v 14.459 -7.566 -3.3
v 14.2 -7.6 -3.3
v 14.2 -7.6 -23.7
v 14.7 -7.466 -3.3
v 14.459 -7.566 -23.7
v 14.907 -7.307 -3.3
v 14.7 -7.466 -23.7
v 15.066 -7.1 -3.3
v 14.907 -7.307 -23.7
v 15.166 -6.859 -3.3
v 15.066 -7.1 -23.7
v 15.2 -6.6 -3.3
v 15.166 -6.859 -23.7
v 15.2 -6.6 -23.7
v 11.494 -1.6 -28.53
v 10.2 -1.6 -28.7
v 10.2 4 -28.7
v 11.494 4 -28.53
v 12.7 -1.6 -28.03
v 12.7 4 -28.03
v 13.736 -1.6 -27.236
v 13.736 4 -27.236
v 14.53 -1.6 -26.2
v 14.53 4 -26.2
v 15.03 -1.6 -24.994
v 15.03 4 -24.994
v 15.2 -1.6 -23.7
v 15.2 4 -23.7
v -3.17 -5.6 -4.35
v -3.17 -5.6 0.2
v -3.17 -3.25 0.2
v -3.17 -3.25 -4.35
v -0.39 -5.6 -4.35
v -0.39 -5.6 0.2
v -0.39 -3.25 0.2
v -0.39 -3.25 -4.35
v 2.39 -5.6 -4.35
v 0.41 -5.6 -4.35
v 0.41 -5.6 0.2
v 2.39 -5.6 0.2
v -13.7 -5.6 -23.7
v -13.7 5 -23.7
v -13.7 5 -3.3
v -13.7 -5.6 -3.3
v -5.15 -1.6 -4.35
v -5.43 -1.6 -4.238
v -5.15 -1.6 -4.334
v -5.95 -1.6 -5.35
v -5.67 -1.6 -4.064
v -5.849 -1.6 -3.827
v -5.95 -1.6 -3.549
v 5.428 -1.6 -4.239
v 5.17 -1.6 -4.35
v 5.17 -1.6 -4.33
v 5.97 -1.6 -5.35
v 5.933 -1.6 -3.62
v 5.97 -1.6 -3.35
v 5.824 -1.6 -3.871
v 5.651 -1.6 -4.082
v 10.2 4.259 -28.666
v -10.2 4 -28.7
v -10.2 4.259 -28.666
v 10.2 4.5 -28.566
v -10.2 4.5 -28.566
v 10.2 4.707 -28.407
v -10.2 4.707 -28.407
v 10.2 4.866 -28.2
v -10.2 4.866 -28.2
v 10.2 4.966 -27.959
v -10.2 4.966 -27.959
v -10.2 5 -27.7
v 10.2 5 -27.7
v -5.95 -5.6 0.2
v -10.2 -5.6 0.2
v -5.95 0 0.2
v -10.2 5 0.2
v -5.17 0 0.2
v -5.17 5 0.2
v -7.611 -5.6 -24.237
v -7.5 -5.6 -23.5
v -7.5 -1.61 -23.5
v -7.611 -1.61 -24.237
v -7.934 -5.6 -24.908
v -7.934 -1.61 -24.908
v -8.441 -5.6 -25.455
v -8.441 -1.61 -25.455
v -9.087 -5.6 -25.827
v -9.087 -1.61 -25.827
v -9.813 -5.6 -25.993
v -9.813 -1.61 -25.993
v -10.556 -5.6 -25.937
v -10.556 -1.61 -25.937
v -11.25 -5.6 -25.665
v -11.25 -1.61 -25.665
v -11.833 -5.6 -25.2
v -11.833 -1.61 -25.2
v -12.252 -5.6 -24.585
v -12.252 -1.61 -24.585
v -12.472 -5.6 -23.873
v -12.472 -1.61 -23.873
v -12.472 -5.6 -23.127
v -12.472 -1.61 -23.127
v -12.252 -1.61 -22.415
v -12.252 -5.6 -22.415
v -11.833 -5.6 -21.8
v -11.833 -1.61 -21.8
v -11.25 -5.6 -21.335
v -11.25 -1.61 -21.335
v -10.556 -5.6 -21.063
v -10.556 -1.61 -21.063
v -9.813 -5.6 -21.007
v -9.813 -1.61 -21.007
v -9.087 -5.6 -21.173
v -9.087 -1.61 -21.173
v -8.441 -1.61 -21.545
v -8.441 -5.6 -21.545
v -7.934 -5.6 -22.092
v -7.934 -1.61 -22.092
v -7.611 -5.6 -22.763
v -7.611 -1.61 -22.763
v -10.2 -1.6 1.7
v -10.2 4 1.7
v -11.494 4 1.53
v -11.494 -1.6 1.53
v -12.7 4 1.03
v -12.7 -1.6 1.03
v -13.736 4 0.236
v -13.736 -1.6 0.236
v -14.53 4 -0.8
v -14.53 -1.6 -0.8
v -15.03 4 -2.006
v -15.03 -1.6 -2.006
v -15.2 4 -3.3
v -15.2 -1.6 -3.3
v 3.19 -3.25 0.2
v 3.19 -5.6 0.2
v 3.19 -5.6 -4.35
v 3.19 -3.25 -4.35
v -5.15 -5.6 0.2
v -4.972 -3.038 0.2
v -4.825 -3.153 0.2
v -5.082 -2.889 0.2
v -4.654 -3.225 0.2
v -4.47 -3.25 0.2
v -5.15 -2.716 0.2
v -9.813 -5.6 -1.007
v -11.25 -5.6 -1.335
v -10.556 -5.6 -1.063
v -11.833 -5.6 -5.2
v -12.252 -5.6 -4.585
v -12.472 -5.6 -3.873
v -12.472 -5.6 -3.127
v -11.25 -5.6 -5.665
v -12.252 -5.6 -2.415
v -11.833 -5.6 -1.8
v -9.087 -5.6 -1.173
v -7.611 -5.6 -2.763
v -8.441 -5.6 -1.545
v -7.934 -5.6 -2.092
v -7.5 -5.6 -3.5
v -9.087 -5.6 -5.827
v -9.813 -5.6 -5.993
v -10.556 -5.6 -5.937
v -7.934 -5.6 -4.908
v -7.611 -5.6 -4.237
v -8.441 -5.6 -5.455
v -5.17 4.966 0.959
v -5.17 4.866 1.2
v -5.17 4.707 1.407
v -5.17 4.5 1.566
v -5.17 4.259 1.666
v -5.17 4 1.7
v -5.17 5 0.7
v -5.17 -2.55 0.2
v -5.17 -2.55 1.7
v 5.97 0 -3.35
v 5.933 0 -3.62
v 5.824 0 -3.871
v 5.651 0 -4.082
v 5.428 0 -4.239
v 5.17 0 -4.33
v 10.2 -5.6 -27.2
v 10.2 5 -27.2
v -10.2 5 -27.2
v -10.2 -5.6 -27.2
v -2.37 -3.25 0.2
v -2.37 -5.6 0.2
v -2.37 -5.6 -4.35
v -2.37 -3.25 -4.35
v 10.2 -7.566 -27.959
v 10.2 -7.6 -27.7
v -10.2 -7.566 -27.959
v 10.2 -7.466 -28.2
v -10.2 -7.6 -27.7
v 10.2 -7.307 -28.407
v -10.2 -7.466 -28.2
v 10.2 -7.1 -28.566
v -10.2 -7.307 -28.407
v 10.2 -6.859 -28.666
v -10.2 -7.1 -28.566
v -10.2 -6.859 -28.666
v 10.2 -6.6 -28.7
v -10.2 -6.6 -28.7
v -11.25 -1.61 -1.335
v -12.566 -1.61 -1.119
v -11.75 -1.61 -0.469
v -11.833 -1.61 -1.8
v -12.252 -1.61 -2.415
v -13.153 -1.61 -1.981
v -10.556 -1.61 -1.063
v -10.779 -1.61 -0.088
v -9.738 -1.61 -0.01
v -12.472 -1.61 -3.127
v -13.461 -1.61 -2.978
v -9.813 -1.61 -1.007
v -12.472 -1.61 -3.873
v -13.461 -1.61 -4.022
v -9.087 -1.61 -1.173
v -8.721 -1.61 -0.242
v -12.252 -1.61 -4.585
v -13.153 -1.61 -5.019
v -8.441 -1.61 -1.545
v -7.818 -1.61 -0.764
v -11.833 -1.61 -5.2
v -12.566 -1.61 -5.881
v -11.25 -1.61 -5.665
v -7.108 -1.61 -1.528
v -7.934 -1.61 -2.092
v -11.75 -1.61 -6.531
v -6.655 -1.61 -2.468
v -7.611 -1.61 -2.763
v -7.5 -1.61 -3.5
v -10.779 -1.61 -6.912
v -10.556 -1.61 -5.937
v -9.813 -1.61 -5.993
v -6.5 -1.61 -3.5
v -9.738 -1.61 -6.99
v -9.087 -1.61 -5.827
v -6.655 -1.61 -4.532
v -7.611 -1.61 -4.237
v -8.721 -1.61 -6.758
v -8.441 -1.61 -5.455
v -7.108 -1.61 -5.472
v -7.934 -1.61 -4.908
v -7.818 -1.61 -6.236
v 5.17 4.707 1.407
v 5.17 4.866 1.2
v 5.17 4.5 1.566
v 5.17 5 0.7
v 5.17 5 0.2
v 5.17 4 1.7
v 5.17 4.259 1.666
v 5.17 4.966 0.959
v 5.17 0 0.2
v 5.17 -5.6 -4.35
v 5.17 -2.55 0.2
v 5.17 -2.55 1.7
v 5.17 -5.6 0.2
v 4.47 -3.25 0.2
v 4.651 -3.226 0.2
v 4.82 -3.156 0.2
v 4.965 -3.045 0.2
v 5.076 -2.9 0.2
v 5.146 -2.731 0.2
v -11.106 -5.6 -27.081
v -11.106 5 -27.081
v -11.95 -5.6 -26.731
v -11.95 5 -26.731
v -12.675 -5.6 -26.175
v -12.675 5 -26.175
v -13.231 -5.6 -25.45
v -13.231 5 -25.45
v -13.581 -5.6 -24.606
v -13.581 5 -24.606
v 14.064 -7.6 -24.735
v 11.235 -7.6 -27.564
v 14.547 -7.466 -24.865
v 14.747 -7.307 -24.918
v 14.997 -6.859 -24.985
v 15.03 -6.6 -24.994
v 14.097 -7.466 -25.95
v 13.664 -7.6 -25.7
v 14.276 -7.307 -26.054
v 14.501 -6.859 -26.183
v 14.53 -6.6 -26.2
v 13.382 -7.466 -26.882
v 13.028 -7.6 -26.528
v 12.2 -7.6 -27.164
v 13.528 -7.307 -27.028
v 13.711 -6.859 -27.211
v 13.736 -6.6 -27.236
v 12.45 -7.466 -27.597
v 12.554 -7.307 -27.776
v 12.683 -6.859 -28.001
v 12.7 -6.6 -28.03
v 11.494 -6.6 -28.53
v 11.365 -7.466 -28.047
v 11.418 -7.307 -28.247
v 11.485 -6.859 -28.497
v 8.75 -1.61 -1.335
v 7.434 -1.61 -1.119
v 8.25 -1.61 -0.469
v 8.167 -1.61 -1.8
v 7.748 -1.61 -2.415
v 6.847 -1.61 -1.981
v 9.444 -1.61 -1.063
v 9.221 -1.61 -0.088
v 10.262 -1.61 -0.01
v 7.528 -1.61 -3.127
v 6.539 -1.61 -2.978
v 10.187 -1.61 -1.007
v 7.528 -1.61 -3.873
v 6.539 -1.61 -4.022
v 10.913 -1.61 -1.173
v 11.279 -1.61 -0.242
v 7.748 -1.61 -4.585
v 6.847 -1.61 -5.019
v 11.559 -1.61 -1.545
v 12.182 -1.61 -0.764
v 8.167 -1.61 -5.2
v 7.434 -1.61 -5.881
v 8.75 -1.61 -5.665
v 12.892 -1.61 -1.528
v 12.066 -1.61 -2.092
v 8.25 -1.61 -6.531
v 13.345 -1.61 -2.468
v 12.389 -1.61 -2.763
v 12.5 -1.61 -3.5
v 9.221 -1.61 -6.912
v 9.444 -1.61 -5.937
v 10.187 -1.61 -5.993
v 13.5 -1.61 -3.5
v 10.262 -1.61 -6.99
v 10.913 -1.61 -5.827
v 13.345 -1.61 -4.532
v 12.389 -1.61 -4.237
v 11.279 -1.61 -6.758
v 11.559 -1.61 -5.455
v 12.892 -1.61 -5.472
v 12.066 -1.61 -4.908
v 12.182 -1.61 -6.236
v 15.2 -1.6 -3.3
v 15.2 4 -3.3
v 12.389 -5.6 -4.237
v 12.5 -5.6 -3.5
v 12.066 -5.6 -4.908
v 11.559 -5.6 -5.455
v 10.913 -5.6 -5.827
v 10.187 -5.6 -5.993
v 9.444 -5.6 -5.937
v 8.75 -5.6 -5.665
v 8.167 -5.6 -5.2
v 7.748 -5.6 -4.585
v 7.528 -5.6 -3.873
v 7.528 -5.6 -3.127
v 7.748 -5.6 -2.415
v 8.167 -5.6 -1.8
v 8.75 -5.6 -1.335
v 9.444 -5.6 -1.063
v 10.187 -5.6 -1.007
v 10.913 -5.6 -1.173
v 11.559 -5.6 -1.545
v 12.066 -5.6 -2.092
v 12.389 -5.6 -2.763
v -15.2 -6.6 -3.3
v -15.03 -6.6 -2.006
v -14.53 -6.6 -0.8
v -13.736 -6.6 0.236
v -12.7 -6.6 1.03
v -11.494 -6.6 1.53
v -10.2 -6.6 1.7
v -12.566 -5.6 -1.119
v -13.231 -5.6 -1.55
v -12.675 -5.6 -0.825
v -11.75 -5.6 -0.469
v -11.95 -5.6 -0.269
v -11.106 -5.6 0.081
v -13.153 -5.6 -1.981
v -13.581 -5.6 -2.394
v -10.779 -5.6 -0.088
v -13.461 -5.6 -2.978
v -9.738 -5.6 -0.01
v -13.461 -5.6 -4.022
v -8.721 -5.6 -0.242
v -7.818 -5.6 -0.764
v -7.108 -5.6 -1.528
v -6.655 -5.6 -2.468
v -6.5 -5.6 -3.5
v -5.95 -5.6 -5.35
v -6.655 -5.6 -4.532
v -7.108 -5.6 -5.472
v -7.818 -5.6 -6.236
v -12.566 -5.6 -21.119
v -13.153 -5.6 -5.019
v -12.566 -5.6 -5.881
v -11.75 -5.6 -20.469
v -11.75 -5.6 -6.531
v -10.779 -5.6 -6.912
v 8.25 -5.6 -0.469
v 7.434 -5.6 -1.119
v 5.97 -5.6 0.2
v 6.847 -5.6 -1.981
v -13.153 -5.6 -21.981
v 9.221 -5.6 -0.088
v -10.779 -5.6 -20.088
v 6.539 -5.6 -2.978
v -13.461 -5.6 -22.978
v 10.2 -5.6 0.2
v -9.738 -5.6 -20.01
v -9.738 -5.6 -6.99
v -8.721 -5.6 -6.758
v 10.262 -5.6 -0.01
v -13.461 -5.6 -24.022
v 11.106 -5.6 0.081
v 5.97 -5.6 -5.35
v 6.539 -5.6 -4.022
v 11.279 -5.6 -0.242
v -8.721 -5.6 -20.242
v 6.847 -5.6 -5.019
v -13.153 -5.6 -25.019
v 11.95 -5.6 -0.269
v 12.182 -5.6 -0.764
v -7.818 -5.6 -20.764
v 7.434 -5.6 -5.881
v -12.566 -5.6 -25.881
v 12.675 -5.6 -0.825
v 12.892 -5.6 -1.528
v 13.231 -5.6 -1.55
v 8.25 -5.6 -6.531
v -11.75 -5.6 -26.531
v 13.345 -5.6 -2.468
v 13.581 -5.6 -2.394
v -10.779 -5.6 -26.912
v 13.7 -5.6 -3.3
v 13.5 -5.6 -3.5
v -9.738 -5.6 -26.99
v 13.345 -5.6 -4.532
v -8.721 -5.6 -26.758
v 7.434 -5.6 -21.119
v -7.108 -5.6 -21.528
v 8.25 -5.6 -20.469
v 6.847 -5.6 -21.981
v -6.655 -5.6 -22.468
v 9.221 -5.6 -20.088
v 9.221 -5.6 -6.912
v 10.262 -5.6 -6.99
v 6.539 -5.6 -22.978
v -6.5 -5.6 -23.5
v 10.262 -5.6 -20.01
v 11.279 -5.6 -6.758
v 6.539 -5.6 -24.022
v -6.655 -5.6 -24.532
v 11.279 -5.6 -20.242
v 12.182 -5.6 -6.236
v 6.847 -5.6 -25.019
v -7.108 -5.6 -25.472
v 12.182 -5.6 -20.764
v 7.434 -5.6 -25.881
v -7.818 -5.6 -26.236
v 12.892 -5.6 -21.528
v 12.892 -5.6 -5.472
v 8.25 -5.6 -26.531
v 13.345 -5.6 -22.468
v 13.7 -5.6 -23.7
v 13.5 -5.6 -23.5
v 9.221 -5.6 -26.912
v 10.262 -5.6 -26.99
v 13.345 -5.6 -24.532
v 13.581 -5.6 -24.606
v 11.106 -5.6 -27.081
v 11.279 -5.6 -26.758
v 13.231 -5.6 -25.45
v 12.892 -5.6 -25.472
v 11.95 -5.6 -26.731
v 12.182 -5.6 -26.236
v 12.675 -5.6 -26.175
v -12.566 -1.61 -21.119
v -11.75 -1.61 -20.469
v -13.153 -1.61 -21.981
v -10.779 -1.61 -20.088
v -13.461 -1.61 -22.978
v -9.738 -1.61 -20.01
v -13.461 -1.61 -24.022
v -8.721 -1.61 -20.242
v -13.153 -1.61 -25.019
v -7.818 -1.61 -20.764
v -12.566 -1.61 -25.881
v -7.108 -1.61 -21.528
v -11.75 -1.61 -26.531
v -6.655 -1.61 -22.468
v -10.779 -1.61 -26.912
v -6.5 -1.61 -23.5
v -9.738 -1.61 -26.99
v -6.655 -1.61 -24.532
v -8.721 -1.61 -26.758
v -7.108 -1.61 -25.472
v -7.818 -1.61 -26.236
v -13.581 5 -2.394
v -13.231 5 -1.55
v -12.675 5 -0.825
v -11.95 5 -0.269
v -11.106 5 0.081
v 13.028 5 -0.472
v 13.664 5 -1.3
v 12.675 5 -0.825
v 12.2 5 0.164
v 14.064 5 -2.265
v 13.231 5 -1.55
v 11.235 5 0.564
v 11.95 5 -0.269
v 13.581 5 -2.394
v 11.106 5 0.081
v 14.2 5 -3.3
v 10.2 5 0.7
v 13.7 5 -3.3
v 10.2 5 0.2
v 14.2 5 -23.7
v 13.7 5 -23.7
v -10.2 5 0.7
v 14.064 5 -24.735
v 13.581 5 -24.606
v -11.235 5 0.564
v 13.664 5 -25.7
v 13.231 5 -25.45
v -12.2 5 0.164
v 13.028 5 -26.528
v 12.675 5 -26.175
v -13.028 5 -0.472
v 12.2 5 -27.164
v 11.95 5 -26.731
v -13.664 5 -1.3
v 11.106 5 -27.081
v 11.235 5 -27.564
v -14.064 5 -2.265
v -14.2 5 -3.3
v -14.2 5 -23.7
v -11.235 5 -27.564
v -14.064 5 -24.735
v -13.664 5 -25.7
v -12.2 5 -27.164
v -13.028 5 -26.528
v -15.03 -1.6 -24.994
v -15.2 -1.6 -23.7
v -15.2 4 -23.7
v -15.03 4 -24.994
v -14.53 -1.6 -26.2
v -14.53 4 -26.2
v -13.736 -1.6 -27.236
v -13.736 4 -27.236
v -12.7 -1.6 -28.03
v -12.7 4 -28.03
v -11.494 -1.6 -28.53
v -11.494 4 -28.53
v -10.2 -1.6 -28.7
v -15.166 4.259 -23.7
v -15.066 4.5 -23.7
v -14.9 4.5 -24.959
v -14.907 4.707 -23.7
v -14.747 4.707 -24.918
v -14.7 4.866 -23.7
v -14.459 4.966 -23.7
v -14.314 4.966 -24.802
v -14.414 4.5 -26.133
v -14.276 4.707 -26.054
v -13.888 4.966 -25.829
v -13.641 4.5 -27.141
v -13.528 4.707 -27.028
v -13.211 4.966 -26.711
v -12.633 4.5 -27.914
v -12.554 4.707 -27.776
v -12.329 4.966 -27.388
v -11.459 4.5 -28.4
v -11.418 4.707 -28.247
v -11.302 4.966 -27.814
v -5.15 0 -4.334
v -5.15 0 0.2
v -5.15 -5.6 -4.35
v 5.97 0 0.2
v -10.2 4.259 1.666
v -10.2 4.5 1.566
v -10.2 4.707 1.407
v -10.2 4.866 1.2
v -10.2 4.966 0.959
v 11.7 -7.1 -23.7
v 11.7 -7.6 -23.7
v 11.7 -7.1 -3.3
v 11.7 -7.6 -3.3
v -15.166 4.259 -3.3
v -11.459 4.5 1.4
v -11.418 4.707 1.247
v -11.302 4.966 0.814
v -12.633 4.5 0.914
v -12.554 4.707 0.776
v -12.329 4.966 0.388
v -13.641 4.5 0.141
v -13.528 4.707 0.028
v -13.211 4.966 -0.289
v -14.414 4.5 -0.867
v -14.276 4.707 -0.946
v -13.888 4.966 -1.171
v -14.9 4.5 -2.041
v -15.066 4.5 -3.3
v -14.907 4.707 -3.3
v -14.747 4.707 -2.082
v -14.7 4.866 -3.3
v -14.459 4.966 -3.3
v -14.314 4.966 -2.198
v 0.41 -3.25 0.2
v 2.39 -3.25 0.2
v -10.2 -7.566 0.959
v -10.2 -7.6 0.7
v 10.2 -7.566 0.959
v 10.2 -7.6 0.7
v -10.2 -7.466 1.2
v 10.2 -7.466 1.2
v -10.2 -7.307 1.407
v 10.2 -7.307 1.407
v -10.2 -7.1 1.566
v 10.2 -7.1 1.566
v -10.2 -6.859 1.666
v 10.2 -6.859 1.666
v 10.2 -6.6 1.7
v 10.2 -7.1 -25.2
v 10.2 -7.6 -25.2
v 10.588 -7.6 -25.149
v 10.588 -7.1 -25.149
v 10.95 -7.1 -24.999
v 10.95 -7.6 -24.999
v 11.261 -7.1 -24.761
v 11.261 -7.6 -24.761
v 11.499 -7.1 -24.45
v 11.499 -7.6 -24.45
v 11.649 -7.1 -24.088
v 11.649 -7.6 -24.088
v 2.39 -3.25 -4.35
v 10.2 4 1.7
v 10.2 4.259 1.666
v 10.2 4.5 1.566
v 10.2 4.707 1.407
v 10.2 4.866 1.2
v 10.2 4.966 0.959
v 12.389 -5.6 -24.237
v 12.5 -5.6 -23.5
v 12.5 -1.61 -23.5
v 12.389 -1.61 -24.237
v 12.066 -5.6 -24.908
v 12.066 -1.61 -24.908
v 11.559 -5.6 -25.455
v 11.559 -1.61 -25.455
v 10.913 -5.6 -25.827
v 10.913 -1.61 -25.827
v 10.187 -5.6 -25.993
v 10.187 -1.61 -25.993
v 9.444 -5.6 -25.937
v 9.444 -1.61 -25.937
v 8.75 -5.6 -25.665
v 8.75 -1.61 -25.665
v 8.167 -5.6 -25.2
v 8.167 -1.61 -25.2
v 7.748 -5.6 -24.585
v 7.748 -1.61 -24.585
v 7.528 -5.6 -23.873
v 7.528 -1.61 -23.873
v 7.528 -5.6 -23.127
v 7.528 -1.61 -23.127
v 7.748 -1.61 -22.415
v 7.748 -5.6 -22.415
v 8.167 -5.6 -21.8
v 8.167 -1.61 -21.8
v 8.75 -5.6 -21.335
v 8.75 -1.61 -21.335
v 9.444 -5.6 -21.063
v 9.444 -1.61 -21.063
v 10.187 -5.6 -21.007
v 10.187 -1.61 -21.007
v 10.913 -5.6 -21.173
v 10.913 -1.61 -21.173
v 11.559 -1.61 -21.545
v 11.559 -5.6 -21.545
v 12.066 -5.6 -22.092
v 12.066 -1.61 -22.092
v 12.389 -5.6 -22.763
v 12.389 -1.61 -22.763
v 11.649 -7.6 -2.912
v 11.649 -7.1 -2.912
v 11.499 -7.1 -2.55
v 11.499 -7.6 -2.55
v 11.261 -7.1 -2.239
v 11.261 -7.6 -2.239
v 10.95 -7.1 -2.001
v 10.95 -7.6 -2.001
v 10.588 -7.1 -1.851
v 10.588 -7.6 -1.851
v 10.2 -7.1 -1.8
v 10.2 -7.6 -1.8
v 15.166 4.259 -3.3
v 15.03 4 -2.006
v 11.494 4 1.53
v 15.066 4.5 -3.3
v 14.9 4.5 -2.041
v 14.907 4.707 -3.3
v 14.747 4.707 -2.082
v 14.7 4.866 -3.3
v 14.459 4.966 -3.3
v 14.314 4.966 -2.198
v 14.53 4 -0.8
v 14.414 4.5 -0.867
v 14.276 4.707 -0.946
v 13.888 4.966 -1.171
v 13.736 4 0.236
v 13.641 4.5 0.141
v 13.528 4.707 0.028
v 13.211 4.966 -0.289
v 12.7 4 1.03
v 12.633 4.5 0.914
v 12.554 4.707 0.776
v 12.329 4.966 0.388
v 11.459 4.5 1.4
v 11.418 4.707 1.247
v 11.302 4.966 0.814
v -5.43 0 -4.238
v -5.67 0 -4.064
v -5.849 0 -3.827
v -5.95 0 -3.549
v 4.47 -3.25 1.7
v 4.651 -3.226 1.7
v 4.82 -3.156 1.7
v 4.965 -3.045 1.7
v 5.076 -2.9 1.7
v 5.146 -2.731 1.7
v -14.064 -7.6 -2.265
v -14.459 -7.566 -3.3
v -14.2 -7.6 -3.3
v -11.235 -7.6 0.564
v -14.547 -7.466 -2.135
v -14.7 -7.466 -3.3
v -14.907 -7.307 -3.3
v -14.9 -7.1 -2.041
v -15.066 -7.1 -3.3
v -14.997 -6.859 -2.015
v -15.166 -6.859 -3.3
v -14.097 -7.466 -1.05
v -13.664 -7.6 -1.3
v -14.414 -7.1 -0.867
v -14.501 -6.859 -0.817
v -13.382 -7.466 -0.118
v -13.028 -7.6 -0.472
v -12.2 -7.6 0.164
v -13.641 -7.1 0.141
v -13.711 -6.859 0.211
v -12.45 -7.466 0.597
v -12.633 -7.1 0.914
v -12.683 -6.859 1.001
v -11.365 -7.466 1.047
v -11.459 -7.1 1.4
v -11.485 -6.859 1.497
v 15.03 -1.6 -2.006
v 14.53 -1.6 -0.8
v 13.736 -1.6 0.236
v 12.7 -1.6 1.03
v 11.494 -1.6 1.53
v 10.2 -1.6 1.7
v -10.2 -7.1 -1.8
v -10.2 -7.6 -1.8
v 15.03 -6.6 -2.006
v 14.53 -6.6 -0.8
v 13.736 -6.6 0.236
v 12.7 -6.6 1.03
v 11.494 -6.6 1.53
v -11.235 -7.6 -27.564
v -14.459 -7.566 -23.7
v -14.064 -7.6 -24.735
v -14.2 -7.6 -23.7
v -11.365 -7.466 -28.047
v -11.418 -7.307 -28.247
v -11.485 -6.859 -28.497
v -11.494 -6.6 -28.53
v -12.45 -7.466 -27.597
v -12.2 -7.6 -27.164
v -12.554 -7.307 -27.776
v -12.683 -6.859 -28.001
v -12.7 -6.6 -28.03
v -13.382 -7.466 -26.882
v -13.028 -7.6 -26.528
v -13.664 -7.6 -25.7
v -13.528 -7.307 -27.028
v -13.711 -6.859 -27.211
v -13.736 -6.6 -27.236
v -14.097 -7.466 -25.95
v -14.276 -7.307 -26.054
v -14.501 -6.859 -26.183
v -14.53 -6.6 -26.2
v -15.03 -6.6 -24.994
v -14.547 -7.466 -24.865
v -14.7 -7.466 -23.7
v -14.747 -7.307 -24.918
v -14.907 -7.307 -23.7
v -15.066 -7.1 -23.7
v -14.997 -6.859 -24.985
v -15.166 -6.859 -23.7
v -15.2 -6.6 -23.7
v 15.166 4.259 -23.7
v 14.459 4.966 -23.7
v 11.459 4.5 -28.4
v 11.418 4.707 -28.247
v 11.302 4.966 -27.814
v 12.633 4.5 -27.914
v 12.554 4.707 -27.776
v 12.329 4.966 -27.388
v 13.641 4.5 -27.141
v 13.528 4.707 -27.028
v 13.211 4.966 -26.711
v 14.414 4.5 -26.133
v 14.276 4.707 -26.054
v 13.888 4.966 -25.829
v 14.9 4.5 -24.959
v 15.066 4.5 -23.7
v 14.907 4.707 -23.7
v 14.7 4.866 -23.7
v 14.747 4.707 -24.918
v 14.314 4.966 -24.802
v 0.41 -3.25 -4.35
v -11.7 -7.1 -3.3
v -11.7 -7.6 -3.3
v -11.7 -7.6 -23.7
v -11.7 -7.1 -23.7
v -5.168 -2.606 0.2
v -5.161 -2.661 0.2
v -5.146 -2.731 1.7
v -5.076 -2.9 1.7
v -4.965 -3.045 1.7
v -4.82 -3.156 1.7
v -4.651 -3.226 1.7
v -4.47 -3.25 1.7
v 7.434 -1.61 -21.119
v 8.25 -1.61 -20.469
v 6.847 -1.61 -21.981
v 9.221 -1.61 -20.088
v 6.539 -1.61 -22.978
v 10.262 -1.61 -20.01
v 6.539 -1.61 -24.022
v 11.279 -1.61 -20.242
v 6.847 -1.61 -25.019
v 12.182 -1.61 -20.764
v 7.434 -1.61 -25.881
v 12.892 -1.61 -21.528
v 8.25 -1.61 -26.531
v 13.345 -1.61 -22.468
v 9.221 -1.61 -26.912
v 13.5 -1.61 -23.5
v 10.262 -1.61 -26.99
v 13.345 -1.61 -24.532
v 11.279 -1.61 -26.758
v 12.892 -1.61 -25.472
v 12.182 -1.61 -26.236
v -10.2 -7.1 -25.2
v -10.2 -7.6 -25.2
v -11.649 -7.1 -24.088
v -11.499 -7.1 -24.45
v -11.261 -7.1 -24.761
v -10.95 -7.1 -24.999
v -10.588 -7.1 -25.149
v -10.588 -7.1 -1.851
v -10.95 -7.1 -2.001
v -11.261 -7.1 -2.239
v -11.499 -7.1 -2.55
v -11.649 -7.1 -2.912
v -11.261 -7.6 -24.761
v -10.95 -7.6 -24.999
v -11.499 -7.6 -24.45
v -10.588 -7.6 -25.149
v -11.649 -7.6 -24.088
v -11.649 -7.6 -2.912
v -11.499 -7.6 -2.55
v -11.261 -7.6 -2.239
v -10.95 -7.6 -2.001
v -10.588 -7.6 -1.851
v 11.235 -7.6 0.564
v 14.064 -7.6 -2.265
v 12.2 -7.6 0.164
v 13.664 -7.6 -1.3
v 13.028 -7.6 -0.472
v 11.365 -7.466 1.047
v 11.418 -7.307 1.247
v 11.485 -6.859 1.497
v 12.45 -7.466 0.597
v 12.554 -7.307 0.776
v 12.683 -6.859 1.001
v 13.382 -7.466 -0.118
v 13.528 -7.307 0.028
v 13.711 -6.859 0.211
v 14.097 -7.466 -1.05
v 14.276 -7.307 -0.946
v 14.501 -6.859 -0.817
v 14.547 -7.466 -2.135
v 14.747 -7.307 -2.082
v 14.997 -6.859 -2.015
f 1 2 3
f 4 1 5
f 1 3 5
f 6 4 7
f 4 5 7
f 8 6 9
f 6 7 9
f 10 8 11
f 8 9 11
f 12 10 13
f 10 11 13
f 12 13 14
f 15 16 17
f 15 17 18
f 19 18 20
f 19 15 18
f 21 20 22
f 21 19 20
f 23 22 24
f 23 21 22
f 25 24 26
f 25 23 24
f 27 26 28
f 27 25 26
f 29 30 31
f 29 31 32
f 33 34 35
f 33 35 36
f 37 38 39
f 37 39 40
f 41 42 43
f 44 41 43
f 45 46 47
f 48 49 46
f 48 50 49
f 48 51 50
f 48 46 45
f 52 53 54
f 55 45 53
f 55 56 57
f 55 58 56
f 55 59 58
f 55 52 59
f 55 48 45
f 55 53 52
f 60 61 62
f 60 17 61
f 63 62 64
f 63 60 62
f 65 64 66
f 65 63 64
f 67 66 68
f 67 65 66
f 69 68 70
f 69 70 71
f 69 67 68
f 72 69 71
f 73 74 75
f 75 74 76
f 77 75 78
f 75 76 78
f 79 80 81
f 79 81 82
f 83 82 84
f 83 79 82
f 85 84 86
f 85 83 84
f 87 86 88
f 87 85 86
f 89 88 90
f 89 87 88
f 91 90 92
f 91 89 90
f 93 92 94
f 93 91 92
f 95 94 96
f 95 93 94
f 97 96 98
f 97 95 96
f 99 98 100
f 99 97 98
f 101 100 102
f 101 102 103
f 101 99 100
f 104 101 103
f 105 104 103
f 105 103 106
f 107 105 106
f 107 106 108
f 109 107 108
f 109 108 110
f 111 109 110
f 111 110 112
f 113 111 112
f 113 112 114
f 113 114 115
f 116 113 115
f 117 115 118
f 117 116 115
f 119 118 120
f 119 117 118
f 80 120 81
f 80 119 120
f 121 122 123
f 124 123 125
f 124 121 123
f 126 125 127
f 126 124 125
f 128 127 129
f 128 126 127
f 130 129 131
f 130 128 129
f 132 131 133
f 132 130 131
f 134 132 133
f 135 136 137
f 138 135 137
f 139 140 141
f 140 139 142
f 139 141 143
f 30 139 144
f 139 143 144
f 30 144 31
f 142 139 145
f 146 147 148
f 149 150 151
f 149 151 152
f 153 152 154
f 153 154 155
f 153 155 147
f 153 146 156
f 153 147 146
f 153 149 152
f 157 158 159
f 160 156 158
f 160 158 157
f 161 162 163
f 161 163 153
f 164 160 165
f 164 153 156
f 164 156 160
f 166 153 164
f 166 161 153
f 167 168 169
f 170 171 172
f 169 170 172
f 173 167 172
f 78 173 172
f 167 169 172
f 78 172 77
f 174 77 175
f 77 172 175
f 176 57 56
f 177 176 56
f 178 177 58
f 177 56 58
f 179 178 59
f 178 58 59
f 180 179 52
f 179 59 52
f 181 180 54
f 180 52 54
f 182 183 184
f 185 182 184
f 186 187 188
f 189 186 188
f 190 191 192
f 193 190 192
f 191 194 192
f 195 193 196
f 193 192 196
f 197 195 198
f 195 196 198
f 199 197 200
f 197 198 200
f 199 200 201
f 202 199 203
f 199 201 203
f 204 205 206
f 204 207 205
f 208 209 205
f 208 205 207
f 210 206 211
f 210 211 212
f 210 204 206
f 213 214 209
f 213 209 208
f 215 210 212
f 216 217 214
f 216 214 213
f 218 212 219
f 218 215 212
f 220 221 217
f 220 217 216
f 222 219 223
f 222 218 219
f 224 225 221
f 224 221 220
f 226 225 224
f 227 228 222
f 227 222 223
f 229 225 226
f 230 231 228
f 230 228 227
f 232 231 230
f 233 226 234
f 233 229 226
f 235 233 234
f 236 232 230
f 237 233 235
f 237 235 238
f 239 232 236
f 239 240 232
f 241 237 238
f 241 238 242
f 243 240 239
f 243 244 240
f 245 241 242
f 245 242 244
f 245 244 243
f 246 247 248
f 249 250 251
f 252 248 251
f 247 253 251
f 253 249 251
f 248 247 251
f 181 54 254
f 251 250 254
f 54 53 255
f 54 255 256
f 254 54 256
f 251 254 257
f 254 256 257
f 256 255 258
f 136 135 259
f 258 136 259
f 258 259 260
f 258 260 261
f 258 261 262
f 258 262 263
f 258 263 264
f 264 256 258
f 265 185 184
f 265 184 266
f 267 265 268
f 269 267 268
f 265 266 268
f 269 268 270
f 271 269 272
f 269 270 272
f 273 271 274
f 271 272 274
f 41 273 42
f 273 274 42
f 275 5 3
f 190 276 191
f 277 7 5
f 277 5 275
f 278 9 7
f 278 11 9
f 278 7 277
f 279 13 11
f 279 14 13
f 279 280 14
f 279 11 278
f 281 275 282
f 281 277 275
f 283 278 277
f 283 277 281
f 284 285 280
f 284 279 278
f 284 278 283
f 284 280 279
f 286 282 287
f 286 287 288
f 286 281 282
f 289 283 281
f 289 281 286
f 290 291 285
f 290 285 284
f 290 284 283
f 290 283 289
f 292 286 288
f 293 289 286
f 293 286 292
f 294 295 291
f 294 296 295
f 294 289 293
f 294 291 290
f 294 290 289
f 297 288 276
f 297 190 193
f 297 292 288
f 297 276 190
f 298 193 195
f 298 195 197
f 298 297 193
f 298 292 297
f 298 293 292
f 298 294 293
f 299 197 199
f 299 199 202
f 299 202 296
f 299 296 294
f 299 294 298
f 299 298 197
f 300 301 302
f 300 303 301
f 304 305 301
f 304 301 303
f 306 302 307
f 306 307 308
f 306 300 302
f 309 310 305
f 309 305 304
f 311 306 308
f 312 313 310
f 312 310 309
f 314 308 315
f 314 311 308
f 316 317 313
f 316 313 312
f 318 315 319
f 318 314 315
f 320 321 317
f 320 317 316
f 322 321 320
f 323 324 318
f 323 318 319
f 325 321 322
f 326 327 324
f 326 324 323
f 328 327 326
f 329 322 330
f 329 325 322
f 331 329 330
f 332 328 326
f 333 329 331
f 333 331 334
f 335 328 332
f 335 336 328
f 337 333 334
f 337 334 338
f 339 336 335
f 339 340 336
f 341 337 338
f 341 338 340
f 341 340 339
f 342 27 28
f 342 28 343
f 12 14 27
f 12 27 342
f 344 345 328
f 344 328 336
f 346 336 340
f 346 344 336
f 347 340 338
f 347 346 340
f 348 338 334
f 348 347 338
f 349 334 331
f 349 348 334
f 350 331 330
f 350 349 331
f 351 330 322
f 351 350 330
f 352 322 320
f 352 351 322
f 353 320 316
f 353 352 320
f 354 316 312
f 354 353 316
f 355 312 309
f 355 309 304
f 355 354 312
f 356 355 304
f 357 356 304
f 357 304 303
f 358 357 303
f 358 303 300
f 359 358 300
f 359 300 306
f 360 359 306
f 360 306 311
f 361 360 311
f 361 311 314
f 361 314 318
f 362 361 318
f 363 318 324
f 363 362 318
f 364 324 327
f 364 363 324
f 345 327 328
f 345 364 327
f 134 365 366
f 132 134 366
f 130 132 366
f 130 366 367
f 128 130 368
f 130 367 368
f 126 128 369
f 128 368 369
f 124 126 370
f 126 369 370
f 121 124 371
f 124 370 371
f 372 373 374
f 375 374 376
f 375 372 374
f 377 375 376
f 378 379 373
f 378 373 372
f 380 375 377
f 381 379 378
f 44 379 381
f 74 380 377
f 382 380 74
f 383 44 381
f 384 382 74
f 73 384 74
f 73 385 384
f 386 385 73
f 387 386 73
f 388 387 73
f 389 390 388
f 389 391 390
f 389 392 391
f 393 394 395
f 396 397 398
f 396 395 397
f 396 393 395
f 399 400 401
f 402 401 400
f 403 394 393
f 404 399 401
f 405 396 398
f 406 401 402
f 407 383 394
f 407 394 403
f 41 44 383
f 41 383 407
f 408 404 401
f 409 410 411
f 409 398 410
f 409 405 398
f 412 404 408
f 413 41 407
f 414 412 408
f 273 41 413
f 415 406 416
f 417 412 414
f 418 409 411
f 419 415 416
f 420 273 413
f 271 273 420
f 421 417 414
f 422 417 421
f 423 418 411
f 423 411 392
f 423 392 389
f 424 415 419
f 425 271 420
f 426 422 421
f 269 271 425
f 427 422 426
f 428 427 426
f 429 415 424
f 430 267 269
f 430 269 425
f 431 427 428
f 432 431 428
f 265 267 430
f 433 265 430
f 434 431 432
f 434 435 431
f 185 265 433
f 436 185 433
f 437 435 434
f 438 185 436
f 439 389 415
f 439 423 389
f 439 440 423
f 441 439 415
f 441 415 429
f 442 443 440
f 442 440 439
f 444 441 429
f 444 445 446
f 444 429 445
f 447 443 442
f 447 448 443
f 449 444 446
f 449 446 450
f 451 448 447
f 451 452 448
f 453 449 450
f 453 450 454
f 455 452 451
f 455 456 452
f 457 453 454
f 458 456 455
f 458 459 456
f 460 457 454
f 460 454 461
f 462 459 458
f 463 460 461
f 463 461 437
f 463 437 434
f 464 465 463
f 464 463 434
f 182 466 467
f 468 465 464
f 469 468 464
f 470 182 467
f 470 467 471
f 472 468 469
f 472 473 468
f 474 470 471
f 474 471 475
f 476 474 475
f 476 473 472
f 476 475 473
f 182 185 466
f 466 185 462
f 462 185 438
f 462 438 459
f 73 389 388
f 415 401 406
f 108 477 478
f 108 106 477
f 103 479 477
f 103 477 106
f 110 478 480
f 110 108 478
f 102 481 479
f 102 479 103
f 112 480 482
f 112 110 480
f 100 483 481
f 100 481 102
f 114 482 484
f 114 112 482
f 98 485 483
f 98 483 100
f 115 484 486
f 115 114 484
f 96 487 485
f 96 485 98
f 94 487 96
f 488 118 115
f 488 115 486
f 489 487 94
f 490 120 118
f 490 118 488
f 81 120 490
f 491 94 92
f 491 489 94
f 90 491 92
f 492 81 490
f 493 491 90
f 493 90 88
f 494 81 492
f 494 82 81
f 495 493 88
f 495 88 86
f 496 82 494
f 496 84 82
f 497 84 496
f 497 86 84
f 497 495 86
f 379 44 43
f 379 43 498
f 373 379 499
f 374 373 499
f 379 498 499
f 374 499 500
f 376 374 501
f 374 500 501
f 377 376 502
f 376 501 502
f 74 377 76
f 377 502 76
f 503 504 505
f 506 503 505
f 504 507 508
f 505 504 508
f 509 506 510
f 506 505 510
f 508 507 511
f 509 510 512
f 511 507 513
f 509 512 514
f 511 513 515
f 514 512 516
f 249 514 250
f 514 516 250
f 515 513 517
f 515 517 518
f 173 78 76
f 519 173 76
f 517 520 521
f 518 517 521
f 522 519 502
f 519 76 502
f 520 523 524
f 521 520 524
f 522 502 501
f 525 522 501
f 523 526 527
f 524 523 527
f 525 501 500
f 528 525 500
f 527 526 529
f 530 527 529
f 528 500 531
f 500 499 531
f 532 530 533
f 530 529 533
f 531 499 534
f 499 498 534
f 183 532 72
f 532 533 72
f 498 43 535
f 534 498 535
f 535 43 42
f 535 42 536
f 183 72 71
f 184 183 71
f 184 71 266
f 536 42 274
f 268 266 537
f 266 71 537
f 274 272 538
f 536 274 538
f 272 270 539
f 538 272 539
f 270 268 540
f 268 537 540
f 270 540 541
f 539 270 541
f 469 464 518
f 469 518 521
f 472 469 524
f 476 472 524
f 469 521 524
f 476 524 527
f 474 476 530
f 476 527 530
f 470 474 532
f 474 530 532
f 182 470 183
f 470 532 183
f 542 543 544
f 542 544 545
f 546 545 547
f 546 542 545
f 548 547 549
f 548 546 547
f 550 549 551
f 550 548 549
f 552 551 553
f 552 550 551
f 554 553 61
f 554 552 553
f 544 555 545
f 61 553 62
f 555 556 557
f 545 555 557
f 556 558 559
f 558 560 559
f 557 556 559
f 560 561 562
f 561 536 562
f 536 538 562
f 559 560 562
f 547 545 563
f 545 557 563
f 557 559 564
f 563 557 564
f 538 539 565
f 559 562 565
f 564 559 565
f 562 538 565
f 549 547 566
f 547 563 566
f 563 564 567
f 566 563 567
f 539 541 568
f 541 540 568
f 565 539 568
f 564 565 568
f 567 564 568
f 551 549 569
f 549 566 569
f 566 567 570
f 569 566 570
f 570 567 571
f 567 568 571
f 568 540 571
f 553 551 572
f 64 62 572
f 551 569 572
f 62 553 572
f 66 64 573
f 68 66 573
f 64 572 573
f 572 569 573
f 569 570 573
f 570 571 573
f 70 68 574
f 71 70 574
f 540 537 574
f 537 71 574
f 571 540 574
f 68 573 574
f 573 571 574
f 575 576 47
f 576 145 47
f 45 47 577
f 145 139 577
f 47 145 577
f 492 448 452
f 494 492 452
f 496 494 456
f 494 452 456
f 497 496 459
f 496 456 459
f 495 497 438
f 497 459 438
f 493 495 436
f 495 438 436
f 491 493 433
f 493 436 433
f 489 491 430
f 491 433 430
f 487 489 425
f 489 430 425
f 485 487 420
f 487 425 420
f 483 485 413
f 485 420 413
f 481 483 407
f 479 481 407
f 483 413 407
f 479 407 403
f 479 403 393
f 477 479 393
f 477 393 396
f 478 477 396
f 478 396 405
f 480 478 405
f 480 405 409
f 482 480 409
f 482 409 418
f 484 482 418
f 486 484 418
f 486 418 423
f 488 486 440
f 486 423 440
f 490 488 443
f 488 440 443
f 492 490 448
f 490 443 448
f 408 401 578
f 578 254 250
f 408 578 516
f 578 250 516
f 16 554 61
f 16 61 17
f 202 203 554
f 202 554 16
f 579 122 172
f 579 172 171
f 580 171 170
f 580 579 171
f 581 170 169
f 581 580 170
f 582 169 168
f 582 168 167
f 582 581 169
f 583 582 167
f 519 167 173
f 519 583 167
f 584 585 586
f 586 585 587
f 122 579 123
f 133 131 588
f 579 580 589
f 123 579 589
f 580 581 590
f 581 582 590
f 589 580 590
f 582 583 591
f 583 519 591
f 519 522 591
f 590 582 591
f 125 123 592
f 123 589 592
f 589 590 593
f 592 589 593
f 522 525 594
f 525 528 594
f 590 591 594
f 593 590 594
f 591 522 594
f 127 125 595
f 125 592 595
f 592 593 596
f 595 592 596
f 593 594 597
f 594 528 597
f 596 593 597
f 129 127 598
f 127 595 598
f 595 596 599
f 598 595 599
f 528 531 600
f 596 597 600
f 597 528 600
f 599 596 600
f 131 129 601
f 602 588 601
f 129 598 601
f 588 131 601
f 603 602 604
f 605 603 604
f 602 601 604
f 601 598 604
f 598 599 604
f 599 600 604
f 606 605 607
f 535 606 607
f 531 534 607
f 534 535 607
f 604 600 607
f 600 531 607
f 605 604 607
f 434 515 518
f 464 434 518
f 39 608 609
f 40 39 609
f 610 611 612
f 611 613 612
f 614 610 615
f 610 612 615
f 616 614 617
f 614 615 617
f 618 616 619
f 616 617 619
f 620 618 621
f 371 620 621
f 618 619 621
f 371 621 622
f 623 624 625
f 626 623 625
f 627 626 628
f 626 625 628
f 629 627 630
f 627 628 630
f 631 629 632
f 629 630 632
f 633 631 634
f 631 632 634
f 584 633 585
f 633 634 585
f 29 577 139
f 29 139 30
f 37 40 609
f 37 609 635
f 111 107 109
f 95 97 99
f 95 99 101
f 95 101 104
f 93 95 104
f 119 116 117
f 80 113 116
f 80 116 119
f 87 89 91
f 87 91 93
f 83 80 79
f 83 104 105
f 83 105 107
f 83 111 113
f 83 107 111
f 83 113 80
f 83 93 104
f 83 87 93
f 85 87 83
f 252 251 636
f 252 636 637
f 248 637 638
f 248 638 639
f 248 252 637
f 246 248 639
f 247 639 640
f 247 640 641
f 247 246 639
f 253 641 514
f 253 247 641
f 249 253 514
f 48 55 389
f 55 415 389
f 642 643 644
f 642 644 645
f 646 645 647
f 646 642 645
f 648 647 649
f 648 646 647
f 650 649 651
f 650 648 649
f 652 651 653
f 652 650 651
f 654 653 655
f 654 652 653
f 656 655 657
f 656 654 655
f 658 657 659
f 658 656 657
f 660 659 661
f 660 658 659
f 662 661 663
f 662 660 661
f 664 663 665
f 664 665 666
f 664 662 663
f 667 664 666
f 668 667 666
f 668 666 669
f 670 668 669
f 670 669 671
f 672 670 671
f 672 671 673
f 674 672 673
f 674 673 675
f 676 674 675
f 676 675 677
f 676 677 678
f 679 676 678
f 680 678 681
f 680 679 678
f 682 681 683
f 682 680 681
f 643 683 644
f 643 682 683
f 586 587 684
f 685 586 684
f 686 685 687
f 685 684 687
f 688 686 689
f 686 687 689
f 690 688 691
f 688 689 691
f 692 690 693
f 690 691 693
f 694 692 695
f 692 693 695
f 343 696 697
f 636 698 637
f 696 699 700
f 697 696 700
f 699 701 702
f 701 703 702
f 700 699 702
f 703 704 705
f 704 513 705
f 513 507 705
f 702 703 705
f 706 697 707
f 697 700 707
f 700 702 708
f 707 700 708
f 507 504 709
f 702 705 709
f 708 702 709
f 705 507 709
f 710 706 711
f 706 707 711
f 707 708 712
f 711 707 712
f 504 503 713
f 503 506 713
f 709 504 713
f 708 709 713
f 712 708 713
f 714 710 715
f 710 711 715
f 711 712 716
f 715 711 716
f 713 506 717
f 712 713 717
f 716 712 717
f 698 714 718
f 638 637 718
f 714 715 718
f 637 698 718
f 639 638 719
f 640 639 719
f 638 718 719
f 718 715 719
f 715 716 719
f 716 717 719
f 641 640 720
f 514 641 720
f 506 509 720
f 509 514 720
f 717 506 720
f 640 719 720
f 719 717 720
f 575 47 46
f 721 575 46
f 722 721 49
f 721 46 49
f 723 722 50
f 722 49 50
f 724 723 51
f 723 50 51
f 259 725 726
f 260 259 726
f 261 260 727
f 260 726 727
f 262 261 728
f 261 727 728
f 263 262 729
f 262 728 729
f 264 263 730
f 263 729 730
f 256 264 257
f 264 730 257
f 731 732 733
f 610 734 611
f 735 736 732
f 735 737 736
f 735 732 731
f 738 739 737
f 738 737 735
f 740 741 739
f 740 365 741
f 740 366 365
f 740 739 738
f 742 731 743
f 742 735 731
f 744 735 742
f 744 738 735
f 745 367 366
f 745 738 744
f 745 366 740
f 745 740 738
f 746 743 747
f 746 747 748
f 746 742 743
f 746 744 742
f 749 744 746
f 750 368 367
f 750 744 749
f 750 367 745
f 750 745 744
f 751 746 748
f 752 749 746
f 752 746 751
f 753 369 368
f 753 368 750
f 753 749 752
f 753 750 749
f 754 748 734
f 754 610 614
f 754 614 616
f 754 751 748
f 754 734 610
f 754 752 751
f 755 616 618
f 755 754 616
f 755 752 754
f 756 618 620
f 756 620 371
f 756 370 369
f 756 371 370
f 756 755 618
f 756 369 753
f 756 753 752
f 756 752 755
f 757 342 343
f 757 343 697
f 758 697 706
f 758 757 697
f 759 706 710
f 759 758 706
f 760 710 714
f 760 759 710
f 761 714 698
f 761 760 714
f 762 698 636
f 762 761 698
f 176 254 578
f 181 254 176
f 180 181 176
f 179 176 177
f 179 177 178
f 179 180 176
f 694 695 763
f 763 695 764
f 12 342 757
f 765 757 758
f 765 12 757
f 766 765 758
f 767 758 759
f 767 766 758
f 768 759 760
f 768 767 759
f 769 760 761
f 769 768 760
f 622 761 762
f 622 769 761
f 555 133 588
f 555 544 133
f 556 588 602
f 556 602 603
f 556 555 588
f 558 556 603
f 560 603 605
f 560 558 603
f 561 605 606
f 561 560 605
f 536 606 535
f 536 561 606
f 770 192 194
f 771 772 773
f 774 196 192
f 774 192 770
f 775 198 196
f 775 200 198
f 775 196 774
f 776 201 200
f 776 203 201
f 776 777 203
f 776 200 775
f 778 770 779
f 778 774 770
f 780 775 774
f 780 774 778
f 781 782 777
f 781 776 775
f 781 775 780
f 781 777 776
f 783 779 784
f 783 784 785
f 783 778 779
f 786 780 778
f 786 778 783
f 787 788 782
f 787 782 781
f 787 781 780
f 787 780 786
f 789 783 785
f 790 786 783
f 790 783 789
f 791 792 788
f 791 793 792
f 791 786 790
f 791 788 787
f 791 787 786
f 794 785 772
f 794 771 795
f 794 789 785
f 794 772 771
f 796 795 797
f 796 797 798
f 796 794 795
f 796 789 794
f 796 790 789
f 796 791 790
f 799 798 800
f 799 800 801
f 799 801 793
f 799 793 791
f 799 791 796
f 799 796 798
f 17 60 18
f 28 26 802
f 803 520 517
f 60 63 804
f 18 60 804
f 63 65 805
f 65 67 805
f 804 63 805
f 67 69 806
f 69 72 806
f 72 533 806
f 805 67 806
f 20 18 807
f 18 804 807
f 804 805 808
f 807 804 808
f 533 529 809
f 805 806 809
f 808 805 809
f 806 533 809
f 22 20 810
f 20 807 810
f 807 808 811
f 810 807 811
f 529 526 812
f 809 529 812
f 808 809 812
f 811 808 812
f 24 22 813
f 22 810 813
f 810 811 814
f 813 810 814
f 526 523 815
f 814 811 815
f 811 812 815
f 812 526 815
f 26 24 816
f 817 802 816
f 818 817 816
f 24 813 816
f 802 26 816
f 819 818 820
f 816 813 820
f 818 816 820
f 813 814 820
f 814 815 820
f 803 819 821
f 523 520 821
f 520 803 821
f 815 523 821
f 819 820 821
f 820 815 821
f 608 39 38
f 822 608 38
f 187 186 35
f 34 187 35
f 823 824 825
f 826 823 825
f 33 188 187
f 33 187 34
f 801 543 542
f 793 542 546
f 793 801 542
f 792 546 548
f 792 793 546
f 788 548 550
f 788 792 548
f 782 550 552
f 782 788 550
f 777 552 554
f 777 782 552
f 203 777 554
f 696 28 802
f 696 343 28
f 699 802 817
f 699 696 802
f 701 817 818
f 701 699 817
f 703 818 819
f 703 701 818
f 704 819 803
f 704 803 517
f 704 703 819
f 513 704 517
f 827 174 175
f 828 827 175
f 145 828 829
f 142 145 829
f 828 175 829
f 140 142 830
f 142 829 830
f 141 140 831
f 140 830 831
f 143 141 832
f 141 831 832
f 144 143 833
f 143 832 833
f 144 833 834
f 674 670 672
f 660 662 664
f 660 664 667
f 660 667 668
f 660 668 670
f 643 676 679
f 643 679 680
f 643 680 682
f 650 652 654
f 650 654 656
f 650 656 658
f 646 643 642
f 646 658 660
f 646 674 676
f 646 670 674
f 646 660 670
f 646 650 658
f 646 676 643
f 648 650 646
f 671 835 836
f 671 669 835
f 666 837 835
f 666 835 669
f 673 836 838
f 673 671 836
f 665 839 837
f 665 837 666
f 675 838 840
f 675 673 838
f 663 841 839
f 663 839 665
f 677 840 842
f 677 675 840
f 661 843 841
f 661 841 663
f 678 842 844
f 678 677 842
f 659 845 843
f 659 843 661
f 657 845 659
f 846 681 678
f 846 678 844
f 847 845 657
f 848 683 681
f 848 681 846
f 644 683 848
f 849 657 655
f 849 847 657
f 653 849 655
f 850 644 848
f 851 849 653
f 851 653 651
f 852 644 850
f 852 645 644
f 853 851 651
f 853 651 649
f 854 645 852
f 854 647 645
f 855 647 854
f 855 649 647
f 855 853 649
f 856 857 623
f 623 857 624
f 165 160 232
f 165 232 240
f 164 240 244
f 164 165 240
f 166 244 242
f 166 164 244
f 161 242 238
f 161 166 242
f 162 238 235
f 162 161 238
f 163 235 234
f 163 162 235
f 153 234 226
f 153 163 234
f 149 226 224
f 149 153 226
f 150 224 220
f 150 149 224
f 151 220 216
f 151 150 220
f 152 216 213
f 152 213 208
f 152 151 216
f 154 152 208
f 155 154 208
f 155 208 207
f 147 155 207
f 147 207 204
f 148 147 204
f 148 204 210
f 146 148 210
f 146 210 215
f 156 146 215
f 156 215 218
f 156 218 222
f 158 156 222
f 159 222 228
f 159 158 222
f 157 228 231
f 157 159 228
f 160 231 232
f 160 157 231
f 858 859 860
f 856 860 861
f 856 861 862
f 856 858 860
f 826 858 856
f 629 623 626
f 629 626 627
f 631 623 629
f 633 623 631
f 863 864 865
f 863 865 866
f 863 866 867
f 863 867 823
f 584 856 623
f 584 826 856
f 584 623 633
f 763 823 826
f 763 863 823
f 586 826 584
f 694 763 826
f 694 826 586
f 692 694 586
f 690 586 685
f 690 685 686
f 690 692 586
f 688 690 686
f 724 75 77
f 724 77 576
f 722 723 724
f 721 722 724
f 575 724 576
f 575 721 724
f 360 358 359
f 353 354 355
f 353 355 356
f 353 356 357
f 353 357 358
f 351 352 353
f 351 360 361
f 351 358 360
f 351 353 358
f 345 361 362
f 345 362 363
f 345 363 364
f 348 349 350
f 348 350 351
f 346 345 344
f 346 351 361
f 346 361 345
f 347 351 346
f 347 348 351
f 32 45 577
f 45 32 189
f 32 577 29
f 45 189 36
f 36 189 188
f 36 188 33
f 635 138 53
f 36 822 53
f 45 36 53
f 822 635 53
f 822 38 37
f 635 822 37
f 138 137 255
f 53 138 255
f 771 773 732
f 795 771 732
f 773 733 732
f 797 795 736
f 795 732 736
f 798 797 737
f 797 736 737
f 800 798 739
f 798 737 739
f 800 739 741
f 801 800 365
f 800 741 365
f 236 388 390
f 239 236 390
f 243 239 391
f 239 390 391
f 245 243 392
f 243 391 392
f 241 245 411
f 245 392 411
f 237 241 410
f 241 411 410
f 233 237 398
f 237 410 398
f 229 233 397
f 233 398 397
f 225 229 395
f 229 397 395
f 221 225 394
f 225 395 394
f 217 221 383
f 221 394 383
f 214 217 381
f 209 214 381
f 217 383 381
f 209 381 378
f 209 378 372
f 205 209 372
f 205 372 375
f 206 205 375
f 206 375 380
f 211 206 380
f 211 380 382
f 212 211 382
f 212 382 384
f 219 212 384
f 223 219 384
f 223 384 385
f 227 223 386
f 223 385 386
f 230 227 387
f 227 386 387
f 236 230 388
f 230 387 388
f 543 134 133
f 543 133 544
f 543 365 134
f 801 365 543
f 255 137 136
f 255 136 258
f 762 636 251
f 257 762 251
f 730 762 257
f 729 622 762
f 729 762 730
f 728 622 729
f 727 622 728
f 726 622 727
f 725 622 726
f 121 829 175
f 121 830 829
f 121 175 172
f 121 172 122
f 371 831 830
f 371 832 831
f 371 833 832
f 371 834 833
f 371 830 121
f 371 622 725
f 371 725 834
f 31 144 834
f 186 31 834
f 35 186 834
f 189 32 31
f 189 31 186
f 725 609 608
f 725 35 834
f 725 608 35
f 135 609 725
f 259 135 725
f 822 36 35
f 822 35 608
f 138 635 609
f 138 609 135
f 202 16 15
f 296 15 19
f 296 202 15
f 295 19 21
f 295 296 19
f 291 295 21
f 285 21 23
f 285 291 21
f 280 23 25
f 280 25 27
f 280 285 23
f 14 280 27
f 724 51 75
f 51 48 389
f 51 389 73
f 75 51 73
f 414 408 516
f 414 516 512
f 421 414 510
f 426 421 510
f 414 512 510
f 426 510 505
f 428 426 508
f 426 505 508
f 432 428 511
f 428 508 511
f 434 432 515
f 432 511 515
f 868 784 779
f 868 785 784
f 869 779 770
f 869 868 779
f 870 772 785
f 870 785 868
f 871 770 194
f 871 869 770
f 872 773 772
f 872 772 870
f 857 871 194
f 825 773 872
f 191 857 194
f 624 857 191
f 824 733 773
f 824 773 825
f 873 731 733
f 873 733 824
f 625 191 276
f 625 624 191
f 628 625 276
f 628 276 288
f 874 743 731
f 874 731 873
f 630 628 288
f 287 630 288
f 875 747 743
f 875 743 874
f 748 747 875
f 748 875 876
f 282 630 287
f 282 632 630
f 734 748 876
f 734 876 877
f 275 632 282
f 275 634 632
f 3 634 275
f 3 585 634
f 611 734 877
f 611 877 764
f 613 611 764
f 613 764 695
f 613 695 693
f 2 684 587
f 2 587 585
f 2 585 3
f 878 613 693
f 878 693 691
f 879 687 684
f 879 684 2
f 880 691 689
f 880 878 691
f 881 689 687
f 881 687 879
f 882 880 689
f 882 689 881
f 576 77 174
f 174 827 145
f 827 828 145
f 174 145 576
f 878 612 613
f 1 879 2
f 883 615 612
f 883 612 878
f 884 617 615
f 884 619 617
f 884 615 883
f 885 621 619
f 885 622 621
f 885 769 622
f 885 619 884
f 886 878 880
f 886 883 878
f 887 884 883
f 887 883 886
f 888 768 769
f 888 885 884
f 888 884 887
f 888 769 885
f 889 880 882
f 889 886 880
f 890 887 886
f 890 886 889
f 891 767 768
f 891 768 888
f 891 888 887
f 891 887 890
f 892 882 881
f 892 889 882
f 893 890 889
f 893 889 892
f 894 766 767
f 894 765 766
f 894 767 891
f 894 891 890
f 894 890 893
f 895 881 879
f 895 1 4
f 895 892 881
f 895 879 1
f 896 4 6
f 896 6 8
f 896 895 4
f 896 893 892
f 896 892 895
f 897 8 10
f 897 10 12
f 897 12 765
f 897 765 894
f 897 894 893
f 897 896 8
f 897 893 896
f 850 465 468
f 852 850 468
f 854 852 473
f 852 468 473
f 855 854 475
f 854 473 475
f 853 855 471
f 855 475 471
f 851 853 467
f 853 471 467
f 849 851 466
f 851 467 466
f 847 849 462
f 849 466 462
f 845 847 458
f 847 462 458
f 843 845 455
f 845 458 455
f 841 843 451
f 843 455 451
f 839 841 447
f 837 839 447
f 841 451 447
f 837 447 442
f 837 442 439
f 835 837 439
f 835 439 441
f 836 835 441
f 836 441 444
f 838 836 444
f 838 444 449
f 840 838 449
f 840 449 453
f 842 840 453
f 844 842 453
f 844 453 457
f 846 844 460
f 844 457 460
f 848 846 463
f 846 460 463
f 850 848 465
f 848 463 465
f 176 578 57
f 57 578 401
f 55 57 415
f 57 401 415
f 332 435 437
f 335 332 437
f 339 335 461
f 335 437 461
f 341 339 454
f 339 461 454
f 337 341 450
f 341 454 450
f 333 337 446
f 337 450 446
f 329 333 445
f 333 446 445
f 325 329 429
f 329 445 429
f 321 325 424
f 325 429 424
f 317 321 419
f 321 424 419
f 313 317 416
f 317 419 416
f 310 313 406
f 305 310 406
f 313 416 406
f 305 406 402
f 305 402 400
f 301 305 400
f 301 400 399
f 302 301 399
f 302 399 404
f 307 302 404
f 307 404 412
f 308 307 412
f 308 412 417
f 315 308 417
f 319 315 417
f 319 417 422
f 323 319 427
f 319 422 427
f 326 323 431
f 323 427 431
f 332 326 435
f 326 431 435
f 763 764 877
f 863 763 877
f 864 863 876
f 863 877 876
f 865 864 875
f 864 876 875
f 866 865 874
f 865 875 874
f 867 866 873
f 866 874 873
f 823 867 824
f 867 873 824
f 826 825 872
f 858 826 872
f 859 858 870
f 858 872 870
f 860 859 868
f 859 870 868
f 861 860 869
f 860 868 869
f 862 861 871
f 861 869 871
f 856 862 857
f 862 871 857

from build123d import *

# Parameters (mm, degrees)
SKETCH2_W           = 30.4
SKETCH2_H           = 30.4
BOSS_EXTRUDE1_DEPTH = 6
FILLET1_R           = 5
FILLET2_R           = 1
CUT_EXTRUDE1_DEPTH  = 0.5
BOSS_EXTRUDE2_DEPTH = 6.6
CUT_EXTRUDE2_DEPTH  = 10.6
FILLET3_R           = 1
CUT_EXTRUDE3_REACH  = 32.4
SKETCH9_W           = 0.8
SKETCH9_H           = 5.55
BOSS_EXTRUDE5_DEPTH = 2.35
LPATTERN1_COUNT     = 5
LPATTERN1_PITCH     = 2.78
SKETCH10_W          = 11.92
SKETCH10_H          = 2.35
BOSS_EXTRUDE6_DEPTH = 1
BOSS_EXTRUDE7_DEPTH = 1.65
SKETCH12_R          = 3.5
SKETCH12_R_2        = 2.5
BOSS_EXTRUDE8_DEPTH = 3.99
BOSS_EXTRUDE9_DEPTH = 1.6


with BuildPart() as part:
    # Sketch2 → Boss-Extrude1 (new body)
    with BuildSketch(Plane.XZ.offset(1.6)):
        with Locations((0, -13.5)):
            Rectangle(SKETCH2_W, SKETCH2_H)
    extrude(amount=BOSS_EXTRUDE1_DEPTH)

    # Fillet1
    fillet1_edges = [part.edges().sort_by_distance(p)[0] for p in [
        (15.2, -4.6, -28.7),
        (-15.2, -4.6, -28.7),
        (-15.2, -4.6, 1.7),
        (15.2, -4.6, 1.7),
    ]]
    fillet(fillet1_edges, radius=FILLET1_R)

    # Fillet2
    fillet2_edges = [part.edges().sort_by_distance(p)[0] for p in [
        (0, -7.6, 1.7),
        (15.2, -7.6, -13.5),
        (-15.2, -7.6, -13.5),
        (0, -7.6, -28.7),
        (-13.735533906, -7.6, -27.235533906),
        (-13.735533906, -7.6, 0.235533906),
        (13.735533906, -7.6, -27.235533906),
        (13.735533906, -7.6, 0.235533906),
    ]]
    fillet(fillet2_edges, radius=FILLET2_R)

    # Sketch3 → Cut-Extrude1 (cut)
    with BuildSketch(Plane.XZ.offset(7.6)):
        with BuildLine():
            Line((10.2, -1.8), (-10.2, -1.8))
            ThreePointArc((-10.2, -1.8), (-11.260660172, -2.239339828), (-11.7, -3.3))
            Line((-11.7, -3.3), (-11.7, -23.7))
            ThreePointArc((-11.7, -23.7), (-11.260660172, -24.760660172), (-10.2, -25.2))
            Line((-10.2, -25.2), (10.2, -25.2))
            ThreePointArc((10.2, -25.2), (11.260660172, -24.760660172), (11.7, -23.7))
            Line((11.7, -23.7), (11.7, -3.3))
            ThreePointArc((11.7, -3.3), (11.260660172, -2.239339828), (10.2, -1.8))
        make_face()
    extrude(amount=-CUT_EXTRUDE1_DEPTH, mode=Mode.SUBTRACT)

    # Sketch4 → Boss-Extrude2 (add)
    with BuildSketch(Plane(origin=(0, -1.6, 0), x_dir=(1, 0, 0), z_dir=(0, 1, 0))):
        with BuildLine():
            Line((15.2, 23.7), (15.2, 3.3))
            ThreePointArc((15.2, 3.3), (13.735533906, -0.235533906), (10.2, -1.7))
            Line((10.2, -1.7), (-10.2, -1.7))
            ThreePointArc((-10.2, -1.7), (-13.735533906, -0.235533906), (-15.2, 3.3))
            Line((-15.2, 3.3), (-15.2, 23.7))
            ThreePointArc((-15.2, 23.7), (-13.735533906, 27.235533906), (-10.2, 28.7))
            Line((-10.2, 28.7), (10.2, 28.7))
            ThreePointArc((10.2, 28.7), (13.735533906, 27.235533906), (15.2, 23.7))
        make_face()
    extrude(amount=BOSS_EXTRUDE2_DEPTH)

    # Sketch5 → Cut-Extrude2 (cut)
    with BuildSketch(Plane(origin=(0, 5, 0), x_dir=(1, 0, 0), z_dir=(0, 1, 0))):
        with BuildLine():
            Line((10.2, 27.2), (-10.2, 27.2))
            ThreePointArc((-10.2, 27.2), (-12.674873734, 26.174873734), (-13.7, 23.7))
            Line((-13.7, 23.7), (-13.7, 3.3))
            ThreePointArc((-13.7, 3.3), (-12.674873734, 0.825126266), (-10.2, -0.2))
            Line((-10.2, -0.2), (10.2, -0.2))
            ThreePointArc((10.2, -0.2), (12.674873734, 0.825126266), (13.7, 3.3))
            Line((13.7, 3.3), (13.7, 23.7))
            ThreePointArc((13.7, 23.7), (12.674873734, 26.174873734), (10.2, 27.2))
        make_face()
    extrude(amount=-CUT_EXTRUDE2_DEPTH, mode=Mode.SUBTRACT)

    # Fillet3
    fillet3_edges = [part.edges().sort_by_distance(p)[0] for p in [
        (13.735533906, 5, -27.235533906),
        (0, 5, -28.7),
        (-13.735533906, 5, -27.235533906),
        (-15.2, 5, -13.5),
        (-13.735533906, 5, 0.235533906),
        (0, 5, 1.7),
        (13.735533906, 5, 0.235533906),
        (15.2, 5, -13.5),
    ]]
    fillet(fillet3_edges, radius=FILLET3_R)

    # Sketch6 → Cut-Extrude3 (cut, up to next)
    with BuildSketch(Plane.XY.offset(1.7), mode=Mode.PRIVATE) as cut_extrude3_sk1:
        with BuildLine():
            Line((5.17, -2.55), (5.17, 5))
            Line((5.17, 5), (-5.17, 5))
            Line((-5.17, 5), (-5.17, -2.55))
            ThreePointArc((-5.17, -2.55), (-4.964974747, -3.044974747), (-4.47, -3.25))
            Line((-4.47, -3.25), (4.47, -3.25))
            ThreePointArc((4.47, -3.25), (4.964974747, -3.044974747), (5.17, -2.55))
        make_face()
    cut_extrude3_tool1 = extrude(cut_extrude3_sk1.sketch, amount=-CUT_EXTRUDE3_REACH, mode=Mode.PRIVATE) & part.part
    add(cut_extrude3_tool1.solids().sort_by_distance((0, 0.884808, 1.7))[0], mode=Mode.SUBTRACT)

    # Sketch9 → Boss-Extrude5 (add)
    with BuildSketch(Plane(origin=(0, -5.6, 0), x_dir=(1, 0, 0), z_dir=(0, 1, 0))):
        with Locations((5.57, 2.575)):
            Rectangle(SKETCH9_W, SKETCH9_H)
    boss_extrude5 = extrude(amount=BOSS_EXTRUDE5_DEPTH)

    # LPattern1: Boss-Extrude5 ×5
    with Locations(*[(-i * LPATTERN1_PITCH, 0, 0) for i in range(1, LPATTERN1_COUNT)]):
        add(boss_extrude5)

    # Sketch10 → Boss-Extrude6 (add)
    with BuildSketch(Plane(origin=(0, 0, -5.35), x_dir=(-1, 0, 0), z_dir=(0, 0, -1))):
        with Locations((-0.01, -4.425)):
            Rectangle(SKETCH10_W, SKETCH10_H)
    extrude(amount=-BOSS_EXTRUDE6_DEPTH)

    # Sketch11 → Boss-Extrude7 (add)
    with BuildSketch(Plane(origin=(0, -3.25, 0), x_dir=(1, 0, 0), z_dir=(0, 1, 0))):
        Polygon((-5.15, 4.35), (5.17, 4.35), (5.17, -0.2), (5.97, -0.2), (5.97, 5.35), (-5.95, 5.35), (-5.95, -0.2), (-5.15, -0.2), align=None)
    extrude(amount=BOSS_EXTRUDE7_DEPTH)

    # Sketch12 → Boss-Extrude8 (add)
    with BuildSketch(Plane(origin=(0, -5.6, 0), x_dir=(1, 0, 0), z_dir=(0, 1, 0))):
        with Locations((10, 3.5)):
            Circle(SKETCH12_R)
        with Locations((10, 3.5)):
            Circle(SKETCH12_R_2, mode=Mode.SUBTRACT)
        with Locations((10, 23.5)):
            Circle(SKETCH12_R)
        with Locations((10, 23.5)):
            Circle(SKETCH12_R_2, mode=Mode.SUBTRACT)
        with Locations((-10, 23.5)):
            Circle(SKETCH12_R)
        with Locations((-10, 23.5)):
            Circle(SKETCH12_R_2, mode=Mode.SUBTRACT)
        with Locations((-10, 3.5)):
            Circle(SKETCH12_R)
        with Locations((-10, 3.5)):
            Circle(SKETCH12_R_2, mode=Mode.SUBTRACT)
    extrude(amount=BOSS_EXTRUDE8_DEPTH)

    # Sketch13 → Boss-Extrude9 (add)
    with BuildSketch(Plane(origin=(0, -1.6, 0), x_dir=(1, 0, 0), z_dir=(0, 1, 0))):
        with BuildLine():
            Line((-5.95, -0.2), (-5.15, -0.2))
            Line((-5.15, -0.2), (-5.15, 4.33366661))
            ThreePointArc((-5.15, 4.33366661), (-5.67023311, 4.063914275), (-5.95, 3.548997487))
            Line((-5.95, 3.548997487), (-5.95, -0.2))
        make_face()
        with BuildLine():
            Line((5.17, -0.2), (5.97, -0.2))
            Line((5.97, -0.2), (5.97, 3.35))
            ThreePointArc((5.97, 3.35), (5.744596669, 3.982455532), (5.17, 4.329795897))
            Line((5.17, 4.329795897), (5.17, -0.2))
        make_face()
    extrude(amount=BOSS_EXTRUDE9_DEPTH)


solid = part.part
